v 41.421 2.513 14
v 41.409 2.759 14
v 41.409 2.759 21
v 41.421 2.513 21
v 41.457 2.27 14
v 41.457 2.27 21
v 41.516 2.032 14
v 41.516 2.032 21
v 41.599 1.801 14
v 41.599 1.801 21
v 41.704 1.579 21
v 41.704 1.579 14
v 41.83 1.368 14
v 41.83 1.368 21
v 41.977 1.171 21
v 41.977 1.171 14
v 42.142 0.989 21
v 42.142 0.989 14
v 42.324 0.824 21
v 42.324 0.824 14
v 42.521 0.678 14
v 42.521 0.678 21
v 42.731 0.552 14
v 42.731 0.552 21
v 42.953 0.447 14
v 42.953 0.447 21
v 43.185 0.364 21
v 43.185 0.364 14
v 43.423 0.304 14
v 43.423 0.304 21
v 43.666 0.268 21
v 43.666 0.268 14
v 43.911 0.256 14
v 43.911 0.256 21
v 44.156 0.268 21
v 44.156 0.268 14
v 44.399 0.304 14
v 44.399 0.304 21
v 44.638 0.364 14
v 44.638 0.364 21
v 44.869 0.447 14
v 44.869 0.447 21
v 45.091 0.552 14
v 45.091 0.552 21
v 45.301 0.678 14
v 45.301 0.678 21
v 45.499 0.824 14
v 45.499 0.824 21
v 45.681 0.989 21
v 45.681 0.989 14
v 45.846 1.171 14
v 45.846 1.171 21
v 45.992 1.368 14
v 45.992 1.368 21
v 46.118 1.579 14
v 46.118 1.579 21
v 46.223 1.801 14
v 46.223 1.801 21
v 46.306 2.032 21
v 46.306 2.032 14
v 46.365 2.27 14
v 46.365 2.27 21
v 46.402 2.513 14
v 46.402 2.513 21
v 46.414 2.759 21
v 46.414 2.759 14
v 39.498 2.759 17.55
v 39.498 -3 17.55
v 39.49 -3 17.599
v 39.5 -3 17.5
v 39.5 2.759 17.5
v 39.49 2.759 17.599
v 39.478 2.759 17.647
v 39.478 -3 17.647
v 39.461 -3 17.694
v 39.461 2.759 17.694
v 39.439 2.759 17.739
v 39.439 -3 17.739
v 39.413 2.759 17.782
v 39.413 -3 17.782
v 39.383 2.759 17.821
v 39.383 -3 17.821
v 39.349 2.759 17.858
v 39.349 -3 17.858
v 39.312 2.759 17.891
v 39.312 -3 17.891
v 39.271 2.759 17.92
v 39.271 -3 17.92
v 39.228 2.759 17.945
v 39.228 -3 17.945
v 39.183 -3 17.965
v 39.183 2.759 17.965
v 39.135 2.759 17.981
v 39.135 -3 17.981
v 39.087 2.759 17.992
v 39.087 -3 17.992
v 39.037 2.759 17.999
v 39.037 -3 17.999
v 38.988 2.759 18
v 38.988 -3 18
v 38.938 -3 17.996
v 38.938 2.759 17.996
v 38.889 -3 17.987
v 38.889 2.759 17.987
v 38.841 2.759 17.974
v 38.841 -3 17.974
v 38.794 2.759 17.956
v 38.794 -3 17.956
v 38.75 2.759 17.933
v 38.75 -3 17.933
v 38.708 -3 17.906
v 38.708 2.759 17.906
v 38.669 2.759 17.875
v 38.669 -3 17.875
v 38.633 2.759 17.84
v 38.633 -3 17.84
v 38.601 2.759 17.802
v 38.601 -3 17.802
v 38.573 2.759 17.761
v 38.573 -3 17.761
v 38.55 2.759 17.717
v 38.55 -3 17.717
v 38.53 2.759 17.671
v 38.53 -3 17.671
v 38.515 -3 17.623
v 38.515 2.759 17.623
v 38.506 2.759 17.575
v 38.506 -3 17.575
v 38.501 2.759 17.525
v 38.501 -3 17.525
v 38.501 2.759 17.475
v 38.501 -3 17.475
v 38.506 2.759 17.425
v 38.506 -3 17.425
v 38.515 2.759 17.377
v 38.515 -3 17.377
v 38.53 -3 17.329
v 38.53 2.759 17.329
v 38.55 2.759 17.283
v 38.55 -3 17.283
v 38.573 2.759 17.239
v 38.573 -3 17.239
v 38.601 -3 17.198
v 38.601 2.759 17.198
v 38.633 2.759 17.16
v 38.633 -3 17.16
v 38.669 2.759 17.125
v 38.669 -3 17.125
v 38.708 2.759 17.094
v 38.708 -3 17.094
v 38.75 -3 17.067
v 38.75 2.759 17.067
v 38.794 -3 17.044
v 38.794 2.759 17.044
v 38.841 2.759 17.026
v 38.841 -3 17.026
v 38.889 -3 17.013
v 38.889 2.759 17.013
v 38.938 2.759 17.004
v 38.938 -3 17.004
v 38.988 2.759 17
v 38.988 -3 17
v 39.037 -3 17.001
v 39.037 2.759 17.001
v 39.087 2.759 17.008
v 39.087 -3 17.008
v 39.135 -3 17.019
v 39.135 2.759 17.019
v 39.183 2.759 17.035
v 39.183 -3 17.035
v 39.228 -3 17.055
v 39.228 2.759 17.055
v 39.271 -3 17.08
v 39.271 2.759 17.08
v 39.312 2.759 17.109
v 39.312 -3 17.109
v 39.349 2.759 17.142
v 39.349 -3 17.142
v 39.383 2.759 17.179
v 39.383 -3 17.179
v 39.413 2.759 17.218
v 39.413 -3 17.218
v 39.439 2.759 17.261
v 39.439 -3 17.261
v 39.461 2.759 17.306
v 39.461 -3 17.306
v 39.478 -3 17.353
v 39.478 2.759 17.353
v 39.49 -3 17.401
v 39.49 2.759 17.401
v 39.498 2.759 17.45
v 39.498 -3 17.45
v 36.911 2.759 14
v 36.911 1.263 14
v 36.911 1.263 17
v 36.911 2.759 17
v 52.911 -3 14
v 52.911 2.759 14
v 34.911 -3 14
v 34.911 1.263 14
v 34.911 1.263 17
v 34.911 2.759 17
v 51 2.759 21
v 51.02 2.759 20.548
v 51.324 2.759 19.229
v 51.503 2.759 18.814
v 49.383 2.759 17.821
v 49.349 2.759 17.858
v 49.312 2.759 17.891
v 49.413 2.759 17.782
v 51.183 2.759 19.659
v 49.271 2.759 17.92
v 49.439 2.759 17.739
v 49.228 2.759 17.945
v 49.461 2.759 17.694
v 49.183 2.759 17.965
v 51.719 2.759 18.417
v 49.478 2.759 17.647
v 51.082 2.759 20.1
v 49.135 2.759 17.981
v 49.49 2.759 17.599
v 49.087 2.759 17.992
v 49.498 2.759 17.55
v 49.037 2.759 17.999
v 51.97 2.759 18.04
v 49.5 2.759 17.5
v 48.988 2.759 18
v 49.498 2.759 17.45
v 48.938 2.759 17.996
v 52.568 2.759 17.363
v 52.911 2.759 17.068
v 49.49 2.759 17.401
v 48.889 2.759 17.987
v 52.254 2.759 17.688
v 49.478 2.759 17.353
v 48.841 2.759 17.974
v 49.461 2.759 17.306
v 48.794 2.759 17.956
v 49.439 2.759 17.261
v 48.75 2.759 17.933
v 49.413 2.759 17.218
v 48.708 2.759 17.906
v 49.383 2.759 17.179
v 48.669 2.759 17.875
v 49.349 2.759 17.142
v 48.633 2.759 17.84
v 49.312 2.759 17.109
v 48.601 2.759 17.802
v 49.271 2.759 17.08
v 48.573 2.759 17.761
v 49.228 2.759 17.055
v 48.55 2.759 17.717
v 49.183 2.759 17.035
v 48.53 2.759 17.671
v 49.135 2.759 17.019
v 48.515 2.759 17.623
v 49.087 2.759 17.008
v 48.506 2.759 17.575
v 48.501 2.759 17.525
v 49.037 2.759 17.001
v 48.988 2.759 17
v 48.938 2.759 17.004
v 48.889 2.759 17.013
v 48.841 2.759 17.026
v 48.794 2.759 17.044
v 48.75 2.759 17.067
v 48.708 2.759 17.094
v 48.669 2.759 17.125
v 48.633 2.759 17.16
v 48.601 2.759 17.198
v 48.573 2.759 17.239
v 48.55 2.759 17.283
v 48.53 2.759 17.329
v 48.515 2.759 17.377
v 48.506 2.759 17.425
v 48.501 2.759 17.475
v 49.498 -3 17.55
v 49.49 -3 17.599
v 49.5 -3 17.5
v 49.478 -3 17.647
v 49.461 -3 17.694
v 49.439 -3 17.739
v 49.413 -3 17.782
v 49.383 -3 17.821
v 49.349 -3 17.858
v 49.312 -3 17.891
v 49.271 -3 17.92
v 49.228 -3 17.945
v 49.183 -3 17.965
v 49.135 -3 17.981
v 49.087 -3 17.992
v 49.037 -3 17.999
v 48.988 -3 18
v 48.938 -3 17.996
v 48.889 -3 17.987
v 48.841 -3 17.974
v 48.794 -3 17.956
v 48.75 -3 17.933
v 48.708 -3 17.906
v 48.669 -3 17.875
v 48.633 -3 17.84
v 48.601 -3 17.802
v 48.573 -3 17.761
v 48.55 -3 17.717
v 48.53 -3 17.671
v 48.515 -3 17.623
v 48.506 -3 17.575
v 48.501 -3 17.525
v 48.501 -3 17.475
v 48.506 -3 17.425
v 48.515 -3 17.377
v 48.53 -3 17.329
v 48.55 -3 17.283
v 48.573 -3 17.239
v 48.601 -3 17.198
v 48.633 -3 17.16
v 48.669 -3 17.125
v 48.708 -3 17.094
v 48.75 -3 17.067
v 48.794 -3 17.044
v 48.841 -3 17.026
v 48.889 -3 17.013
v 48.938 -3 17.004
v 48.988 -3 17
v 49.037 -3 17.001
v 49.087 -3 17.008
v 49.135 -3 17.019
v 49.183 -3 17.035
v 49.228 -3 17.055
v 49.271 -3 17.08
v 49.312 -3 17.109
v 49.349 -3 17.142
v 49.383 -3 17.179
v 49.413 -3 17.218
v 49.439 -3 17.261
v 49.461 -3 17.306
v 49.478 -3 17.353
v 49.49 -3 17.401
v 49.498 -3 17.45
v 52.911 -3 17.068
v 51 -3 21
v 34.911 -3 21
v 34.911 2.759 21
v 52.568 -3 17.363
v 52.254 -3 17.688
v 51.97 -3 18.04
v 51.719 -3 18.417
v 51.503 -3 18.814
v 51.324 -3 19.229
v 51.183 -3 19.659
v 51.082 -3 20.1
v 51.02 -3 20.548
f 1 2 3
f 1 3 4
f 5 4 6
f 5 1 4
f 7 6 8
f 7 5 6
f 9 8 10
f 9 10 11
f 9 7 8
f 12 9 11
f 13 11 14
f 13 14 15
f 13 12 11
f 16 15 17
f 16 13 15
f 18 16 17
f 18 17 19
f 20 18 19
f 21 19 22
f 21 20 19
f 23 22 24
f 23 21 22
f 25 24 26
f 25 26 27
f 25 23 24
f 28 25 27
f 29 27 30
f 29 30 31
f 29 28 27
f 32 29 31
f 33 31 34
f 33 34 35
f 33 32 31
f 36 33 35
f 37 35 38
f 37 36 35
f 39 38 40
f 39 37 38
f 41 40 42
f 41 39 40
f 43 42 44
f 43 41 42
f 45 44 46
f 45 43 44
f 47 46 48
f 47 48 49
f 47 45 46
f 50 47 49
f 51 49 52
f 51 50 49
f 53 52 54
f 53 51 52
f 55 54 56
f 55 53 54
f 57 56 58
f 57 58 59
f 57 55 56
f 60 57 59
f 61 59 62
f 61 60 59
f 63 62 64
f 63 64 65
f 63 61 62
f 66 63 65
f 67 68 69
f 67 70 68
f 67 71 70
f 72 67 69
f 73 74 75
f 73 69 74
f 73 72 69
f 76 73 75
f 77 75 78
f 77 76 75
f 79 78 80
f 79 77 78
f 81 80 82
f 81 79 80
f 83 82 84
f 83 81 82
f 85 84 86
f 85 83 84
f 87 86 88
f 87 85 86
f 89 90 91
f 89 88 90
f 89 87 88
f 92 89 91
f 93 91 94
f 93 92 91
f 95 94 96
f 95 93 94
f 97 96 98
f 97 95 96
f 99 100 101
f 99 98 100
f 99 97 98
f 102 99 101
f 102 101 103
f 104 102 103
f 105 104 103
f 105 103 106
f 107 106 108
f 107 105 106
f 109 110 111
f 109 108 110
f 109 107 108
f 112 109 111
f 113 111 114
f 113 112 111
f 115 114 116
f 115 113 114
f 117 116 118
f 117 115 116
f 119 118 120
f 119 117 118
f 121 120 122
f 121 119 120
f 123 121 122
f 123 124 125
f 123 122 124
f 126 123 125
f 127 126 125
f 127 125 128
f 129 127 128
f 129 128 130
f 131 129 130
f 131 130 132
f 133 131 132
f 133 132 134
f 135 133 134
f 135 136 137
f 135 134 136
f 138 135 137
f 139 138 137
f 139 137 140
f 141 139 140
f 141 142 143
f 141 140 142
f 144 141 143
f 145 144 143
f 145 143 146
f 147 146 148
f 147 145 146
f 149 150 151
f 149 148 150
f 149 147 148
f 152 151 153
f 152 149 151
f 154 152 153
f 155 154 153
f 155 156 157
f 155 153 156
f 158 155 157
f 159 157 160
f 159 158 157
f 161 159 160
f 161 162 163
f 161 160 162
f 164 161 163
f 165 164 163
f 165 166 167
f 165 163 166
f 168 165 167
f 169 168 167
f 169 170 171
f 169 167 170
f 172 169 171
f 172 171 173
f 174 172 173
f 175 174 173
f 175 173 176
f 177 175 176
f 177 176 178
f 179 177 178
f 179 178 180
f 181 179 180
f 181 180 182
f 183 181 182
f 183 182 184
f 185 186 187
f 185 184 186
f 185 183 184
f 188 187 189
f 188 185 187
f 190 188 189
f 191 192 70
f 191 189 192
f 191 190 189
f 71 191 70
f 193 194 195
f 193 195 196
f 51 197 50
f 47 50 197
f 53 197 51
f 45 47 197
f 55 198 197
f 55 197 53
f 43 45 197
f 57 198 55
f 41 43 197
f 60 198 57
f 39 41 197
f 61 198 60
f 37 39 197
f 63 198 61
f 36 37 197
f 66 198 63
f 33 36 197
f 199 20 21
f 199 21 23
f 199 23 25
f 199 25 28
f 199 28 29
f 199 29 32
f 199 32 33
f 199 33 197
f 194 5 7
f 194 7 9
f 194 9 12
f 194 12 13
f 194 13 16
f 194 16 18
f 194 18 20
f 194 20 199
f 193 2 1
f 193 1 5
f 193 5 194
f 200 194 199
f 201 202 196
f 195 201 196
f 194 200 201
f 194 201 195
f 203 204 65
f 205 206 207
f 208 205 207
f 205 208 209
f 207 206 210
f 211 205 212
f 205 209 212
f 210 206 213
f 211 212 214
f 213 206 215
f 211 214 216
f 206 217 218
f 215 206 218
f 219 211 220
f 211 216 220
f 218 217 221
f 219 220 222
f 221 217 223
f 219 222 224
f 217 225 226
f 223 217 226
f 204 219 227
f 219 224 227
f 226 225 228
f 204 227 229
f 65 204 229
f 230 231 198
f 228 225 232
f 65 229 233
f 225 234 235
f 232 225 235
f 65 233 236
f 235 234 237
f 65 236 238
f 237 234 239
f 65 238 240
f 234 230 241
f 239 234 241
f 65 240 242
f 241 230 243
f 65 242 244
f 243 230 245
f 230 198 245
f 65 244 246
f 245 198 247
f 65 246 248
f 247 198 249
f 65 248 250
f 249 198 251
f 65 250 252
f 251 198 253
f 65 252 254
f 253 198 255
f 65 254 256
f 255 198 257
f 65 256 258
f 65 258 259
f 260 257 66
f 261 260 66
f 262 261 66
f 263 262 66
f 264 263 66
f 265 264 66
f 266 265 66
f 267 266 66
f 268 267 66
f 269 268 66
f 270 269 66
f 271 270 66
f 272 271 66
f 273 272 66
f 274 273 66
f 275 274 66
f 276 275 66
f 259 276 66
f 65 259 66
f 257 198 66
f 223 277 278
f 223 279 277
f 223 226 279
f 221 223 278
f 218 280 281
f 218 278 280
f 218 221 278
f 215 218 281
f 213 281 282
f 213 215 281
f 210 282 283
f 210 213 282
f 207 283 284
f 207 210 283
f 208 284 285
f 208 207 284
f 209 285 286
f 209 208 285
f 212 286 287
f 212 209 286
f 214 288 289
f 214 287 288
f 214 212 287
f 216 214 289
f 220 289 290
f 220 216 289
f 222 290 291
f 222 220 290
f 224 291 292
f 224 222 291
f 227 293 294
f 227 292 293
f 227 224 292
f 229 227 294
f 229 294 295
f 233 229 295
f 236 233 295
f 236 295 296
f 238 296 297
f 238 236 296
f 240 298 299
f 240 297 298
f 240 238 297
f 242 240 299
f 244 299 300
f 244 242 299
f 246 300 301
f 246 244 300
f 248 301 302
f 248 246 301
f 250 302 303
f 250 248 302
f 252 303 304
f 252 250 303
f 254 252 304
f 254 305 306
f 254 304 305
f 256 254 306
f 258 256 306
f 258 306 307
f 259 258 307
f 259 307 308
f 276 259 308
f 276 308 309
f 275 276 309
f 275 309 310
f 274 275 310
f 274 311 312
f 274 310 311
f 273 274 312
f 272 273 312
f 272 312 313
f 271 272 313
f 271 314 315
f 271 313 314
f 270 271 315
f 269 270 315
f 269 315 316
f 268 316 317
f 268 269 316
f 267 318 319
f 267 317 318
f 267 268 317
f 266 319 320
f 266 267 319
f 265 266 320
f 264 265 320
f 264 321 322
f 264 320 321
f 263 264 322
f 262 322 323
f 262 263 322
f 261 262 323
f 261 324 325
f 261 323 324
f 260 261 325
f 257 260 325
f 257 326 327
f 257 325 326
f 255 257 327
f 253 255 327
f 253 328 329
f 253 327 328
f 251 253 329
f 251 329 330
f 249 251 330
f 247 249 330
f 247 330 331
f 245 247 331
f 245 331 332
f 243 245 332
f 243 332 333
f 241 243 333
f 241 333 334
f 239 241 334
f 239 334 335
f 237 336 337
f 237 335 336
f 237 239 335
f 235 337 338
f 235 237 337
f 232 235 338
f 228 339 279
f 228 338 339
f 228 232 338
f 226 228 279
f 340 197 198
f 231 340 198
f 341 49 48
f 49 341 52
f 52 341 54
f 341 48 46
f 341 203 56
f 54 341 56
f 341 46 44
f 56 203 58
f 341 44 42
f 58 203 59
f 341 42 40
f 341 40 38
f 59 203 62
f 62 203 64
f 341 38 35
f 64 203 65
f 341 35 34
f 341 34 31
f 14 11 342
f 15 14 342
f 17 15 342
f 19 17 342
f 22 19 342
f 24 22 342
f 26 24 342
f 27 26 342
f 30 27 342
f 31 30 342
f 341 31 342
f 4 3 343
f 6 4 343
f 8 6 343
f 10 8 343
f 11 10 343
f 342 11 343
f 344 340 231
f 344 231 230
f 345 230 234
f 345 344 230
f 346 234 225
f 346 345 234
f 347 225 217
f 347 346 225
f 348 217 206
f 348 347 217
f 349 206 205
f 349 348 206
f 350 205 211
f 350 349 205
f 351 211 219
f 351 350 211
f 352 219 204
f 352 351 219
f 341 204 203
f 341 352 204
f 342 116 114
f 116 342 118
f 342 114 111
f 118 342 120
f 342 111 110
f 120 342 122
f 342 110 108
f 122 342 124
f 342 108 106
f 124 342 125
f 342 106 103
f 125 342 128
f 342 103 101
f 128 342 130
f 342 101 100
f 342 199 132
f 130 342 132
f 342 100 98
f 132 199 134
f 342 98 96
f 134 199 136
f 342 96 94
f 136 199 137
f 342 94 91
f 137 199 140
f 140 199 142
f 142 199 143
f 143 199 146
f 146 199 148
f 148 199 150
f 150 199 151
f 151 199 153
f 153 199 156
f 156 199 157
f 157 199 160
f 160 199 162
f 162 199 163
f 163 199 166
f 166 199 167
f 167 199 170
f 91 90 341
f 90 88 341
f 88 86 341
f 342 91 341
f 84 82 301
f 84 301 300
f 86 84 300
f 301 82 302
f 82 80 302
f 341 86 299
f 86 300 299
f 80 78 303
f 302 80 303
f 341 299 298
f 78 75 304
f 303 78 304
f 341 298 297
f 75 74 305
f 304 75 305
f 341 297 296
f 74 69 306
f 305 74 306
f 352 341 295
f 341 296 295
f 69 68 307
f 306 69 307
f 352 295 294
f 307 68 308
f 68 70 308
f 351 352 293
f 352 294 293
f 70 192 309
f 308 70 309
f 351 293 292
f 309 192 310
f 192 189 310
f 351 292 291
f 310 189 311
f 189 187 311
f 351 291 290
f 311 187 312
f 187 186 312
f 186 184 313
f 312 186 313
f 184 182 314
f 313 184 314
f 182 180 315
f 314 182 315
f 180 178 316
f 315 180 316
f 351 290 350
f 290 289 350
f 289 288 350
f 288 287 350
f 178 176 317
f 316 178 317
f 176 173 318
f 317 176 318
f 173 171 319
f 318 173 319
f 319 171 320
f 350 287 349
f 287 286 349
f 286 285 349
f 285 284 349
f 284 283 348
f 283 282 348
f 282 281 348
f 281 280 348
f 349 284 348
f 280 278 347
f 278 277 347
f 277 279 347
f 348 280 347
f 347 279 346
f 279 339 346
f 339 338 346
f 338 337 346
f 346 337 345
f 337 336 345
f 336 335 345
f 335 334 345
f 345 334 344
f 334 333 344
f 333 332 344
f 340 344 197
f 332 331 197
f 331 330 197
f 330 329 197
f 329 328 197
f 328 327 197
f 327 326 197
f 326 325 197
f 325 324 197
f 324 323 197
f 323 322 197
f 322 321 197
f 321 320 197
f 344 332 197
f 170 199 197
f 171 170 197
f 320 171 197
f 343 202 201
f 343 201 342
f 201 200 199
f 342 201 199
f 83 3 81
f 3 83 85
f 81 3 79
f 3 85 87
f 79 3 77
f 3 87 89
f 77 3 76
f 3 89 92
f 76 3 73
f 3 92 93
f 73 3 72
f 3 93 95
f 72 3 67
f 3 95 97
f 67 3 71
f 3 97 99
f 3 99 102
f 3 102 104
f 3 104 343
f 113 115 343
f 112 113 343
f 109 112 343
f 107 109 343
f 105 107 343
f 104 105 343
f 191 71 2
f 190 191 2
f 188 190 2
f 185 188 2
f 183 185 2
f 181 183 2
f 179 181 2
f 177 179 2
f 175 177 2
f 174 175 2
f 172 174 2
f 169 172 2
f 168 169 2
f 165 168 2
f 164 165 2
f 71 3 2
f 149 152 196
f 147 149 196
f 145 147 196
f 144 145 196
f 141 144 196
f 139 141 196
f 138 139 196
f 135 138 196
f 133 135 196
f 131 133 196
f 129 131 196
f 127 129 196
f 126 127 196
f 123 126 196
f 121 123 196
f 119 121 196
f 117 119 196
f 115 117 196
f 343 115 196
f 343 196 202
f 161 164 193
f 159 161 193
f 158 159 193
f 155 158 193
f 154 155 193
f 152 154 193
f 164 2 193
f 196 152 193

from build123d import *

# Parameters (mm, degrees)
CYLINDER024_R     = 0.5
CYLINDER024_DEPTH = 20
CYLINDER025_R     = 0.5
CYLINDER025_DEPTH = 20
CYLINDER007_R     = 5
CYLINDER007_DEPTH = 13
PAD006_DEPTH      = 7
SKETCH064_W       = 2
SKETCH064_H       = 3
POCKET006_DEPTH   = 3


with BuildPart() as cylinder024:
    # Cylinder024 → Cylinder024 (new body)
    with BuildSketch(Plane(origin=(39, 12, 17.5), x_dir=(1, 0, 0), z_dir=(0, -1, 0))):
        Circle(CYLINDER024_R)
    extrude(amount=CYLINDER024_DEPTH)


with BuildPart() as fusion025:
    # Cylinder025 → Cylinder025 (new body)
    with BuildSketch(Plane(origin=(49, 12, 17.5), x_dir=(1, 0, 0), z_dir=(0, -1, 0))):
        Circle(CYLINDER025_R)
    extrude(amount=CYLINDER025_DEPTH)

    # Fusion025: union Cylinder024
    add(cylinder024.part)


with BuildPart() as cylinder007:
    # Cylinder007 → Cylinder007 (new body)
    with BuildSketch(Plane(origin=(56, -3, 21), x_dir=(1, 0, 0), z_dir=(0, 1, 0))):
        Circle(CYLINDER007_R)
    extrude(amount=CYLINDER007_DEPTH)


with BuildPart() as potbottommount:
    # Sketch054 → Pad006 (new body)
    with BuildSketch(Plane.XY):
        with BuildLine():
            ThreePointArc((41.408643, 2.758552), (43.911108, 0.256087), (46.413573, 2.758552))
            Line((52.911107, 2.758552), (46.413573, 2.758552))
            Line((52.911107, -3), (52.911107, 2.758552))
            Line((34.911109, -3), (52.911107, -3))
            Line((34.911109, 2.758552), (34.911109, -3))
            Line((41.408643, 2.758552), (34.911109, 2.758552))
        make_face()
    extrude(amount=PAD006_DEPTH)

    # Sketch064 → Pocket006 (cut)
    with BuildSketch(Plane.XY):
        with Locations((35.911109, 2.762661)):
            Rectangle(SKETCH064_W, SKETCH064_H)
    extrude(amount=POCKET006_DEPTH, mode=Mode.SUBTRACT)


with BuildPart() as potbottommount_1:
    # Body006 placement: moved
    add(potbottommount.part.moved(Location((0, 0, 14))))

    # Cut004: cut Cylinder007
    add(cylinder007.part, mode=Mode.SUBTRACT)

    # Cut018: cut Fusion025
    add(fusion025.part, mode=Mode.SUBTRACT)


solid = potbottommount_1.part
